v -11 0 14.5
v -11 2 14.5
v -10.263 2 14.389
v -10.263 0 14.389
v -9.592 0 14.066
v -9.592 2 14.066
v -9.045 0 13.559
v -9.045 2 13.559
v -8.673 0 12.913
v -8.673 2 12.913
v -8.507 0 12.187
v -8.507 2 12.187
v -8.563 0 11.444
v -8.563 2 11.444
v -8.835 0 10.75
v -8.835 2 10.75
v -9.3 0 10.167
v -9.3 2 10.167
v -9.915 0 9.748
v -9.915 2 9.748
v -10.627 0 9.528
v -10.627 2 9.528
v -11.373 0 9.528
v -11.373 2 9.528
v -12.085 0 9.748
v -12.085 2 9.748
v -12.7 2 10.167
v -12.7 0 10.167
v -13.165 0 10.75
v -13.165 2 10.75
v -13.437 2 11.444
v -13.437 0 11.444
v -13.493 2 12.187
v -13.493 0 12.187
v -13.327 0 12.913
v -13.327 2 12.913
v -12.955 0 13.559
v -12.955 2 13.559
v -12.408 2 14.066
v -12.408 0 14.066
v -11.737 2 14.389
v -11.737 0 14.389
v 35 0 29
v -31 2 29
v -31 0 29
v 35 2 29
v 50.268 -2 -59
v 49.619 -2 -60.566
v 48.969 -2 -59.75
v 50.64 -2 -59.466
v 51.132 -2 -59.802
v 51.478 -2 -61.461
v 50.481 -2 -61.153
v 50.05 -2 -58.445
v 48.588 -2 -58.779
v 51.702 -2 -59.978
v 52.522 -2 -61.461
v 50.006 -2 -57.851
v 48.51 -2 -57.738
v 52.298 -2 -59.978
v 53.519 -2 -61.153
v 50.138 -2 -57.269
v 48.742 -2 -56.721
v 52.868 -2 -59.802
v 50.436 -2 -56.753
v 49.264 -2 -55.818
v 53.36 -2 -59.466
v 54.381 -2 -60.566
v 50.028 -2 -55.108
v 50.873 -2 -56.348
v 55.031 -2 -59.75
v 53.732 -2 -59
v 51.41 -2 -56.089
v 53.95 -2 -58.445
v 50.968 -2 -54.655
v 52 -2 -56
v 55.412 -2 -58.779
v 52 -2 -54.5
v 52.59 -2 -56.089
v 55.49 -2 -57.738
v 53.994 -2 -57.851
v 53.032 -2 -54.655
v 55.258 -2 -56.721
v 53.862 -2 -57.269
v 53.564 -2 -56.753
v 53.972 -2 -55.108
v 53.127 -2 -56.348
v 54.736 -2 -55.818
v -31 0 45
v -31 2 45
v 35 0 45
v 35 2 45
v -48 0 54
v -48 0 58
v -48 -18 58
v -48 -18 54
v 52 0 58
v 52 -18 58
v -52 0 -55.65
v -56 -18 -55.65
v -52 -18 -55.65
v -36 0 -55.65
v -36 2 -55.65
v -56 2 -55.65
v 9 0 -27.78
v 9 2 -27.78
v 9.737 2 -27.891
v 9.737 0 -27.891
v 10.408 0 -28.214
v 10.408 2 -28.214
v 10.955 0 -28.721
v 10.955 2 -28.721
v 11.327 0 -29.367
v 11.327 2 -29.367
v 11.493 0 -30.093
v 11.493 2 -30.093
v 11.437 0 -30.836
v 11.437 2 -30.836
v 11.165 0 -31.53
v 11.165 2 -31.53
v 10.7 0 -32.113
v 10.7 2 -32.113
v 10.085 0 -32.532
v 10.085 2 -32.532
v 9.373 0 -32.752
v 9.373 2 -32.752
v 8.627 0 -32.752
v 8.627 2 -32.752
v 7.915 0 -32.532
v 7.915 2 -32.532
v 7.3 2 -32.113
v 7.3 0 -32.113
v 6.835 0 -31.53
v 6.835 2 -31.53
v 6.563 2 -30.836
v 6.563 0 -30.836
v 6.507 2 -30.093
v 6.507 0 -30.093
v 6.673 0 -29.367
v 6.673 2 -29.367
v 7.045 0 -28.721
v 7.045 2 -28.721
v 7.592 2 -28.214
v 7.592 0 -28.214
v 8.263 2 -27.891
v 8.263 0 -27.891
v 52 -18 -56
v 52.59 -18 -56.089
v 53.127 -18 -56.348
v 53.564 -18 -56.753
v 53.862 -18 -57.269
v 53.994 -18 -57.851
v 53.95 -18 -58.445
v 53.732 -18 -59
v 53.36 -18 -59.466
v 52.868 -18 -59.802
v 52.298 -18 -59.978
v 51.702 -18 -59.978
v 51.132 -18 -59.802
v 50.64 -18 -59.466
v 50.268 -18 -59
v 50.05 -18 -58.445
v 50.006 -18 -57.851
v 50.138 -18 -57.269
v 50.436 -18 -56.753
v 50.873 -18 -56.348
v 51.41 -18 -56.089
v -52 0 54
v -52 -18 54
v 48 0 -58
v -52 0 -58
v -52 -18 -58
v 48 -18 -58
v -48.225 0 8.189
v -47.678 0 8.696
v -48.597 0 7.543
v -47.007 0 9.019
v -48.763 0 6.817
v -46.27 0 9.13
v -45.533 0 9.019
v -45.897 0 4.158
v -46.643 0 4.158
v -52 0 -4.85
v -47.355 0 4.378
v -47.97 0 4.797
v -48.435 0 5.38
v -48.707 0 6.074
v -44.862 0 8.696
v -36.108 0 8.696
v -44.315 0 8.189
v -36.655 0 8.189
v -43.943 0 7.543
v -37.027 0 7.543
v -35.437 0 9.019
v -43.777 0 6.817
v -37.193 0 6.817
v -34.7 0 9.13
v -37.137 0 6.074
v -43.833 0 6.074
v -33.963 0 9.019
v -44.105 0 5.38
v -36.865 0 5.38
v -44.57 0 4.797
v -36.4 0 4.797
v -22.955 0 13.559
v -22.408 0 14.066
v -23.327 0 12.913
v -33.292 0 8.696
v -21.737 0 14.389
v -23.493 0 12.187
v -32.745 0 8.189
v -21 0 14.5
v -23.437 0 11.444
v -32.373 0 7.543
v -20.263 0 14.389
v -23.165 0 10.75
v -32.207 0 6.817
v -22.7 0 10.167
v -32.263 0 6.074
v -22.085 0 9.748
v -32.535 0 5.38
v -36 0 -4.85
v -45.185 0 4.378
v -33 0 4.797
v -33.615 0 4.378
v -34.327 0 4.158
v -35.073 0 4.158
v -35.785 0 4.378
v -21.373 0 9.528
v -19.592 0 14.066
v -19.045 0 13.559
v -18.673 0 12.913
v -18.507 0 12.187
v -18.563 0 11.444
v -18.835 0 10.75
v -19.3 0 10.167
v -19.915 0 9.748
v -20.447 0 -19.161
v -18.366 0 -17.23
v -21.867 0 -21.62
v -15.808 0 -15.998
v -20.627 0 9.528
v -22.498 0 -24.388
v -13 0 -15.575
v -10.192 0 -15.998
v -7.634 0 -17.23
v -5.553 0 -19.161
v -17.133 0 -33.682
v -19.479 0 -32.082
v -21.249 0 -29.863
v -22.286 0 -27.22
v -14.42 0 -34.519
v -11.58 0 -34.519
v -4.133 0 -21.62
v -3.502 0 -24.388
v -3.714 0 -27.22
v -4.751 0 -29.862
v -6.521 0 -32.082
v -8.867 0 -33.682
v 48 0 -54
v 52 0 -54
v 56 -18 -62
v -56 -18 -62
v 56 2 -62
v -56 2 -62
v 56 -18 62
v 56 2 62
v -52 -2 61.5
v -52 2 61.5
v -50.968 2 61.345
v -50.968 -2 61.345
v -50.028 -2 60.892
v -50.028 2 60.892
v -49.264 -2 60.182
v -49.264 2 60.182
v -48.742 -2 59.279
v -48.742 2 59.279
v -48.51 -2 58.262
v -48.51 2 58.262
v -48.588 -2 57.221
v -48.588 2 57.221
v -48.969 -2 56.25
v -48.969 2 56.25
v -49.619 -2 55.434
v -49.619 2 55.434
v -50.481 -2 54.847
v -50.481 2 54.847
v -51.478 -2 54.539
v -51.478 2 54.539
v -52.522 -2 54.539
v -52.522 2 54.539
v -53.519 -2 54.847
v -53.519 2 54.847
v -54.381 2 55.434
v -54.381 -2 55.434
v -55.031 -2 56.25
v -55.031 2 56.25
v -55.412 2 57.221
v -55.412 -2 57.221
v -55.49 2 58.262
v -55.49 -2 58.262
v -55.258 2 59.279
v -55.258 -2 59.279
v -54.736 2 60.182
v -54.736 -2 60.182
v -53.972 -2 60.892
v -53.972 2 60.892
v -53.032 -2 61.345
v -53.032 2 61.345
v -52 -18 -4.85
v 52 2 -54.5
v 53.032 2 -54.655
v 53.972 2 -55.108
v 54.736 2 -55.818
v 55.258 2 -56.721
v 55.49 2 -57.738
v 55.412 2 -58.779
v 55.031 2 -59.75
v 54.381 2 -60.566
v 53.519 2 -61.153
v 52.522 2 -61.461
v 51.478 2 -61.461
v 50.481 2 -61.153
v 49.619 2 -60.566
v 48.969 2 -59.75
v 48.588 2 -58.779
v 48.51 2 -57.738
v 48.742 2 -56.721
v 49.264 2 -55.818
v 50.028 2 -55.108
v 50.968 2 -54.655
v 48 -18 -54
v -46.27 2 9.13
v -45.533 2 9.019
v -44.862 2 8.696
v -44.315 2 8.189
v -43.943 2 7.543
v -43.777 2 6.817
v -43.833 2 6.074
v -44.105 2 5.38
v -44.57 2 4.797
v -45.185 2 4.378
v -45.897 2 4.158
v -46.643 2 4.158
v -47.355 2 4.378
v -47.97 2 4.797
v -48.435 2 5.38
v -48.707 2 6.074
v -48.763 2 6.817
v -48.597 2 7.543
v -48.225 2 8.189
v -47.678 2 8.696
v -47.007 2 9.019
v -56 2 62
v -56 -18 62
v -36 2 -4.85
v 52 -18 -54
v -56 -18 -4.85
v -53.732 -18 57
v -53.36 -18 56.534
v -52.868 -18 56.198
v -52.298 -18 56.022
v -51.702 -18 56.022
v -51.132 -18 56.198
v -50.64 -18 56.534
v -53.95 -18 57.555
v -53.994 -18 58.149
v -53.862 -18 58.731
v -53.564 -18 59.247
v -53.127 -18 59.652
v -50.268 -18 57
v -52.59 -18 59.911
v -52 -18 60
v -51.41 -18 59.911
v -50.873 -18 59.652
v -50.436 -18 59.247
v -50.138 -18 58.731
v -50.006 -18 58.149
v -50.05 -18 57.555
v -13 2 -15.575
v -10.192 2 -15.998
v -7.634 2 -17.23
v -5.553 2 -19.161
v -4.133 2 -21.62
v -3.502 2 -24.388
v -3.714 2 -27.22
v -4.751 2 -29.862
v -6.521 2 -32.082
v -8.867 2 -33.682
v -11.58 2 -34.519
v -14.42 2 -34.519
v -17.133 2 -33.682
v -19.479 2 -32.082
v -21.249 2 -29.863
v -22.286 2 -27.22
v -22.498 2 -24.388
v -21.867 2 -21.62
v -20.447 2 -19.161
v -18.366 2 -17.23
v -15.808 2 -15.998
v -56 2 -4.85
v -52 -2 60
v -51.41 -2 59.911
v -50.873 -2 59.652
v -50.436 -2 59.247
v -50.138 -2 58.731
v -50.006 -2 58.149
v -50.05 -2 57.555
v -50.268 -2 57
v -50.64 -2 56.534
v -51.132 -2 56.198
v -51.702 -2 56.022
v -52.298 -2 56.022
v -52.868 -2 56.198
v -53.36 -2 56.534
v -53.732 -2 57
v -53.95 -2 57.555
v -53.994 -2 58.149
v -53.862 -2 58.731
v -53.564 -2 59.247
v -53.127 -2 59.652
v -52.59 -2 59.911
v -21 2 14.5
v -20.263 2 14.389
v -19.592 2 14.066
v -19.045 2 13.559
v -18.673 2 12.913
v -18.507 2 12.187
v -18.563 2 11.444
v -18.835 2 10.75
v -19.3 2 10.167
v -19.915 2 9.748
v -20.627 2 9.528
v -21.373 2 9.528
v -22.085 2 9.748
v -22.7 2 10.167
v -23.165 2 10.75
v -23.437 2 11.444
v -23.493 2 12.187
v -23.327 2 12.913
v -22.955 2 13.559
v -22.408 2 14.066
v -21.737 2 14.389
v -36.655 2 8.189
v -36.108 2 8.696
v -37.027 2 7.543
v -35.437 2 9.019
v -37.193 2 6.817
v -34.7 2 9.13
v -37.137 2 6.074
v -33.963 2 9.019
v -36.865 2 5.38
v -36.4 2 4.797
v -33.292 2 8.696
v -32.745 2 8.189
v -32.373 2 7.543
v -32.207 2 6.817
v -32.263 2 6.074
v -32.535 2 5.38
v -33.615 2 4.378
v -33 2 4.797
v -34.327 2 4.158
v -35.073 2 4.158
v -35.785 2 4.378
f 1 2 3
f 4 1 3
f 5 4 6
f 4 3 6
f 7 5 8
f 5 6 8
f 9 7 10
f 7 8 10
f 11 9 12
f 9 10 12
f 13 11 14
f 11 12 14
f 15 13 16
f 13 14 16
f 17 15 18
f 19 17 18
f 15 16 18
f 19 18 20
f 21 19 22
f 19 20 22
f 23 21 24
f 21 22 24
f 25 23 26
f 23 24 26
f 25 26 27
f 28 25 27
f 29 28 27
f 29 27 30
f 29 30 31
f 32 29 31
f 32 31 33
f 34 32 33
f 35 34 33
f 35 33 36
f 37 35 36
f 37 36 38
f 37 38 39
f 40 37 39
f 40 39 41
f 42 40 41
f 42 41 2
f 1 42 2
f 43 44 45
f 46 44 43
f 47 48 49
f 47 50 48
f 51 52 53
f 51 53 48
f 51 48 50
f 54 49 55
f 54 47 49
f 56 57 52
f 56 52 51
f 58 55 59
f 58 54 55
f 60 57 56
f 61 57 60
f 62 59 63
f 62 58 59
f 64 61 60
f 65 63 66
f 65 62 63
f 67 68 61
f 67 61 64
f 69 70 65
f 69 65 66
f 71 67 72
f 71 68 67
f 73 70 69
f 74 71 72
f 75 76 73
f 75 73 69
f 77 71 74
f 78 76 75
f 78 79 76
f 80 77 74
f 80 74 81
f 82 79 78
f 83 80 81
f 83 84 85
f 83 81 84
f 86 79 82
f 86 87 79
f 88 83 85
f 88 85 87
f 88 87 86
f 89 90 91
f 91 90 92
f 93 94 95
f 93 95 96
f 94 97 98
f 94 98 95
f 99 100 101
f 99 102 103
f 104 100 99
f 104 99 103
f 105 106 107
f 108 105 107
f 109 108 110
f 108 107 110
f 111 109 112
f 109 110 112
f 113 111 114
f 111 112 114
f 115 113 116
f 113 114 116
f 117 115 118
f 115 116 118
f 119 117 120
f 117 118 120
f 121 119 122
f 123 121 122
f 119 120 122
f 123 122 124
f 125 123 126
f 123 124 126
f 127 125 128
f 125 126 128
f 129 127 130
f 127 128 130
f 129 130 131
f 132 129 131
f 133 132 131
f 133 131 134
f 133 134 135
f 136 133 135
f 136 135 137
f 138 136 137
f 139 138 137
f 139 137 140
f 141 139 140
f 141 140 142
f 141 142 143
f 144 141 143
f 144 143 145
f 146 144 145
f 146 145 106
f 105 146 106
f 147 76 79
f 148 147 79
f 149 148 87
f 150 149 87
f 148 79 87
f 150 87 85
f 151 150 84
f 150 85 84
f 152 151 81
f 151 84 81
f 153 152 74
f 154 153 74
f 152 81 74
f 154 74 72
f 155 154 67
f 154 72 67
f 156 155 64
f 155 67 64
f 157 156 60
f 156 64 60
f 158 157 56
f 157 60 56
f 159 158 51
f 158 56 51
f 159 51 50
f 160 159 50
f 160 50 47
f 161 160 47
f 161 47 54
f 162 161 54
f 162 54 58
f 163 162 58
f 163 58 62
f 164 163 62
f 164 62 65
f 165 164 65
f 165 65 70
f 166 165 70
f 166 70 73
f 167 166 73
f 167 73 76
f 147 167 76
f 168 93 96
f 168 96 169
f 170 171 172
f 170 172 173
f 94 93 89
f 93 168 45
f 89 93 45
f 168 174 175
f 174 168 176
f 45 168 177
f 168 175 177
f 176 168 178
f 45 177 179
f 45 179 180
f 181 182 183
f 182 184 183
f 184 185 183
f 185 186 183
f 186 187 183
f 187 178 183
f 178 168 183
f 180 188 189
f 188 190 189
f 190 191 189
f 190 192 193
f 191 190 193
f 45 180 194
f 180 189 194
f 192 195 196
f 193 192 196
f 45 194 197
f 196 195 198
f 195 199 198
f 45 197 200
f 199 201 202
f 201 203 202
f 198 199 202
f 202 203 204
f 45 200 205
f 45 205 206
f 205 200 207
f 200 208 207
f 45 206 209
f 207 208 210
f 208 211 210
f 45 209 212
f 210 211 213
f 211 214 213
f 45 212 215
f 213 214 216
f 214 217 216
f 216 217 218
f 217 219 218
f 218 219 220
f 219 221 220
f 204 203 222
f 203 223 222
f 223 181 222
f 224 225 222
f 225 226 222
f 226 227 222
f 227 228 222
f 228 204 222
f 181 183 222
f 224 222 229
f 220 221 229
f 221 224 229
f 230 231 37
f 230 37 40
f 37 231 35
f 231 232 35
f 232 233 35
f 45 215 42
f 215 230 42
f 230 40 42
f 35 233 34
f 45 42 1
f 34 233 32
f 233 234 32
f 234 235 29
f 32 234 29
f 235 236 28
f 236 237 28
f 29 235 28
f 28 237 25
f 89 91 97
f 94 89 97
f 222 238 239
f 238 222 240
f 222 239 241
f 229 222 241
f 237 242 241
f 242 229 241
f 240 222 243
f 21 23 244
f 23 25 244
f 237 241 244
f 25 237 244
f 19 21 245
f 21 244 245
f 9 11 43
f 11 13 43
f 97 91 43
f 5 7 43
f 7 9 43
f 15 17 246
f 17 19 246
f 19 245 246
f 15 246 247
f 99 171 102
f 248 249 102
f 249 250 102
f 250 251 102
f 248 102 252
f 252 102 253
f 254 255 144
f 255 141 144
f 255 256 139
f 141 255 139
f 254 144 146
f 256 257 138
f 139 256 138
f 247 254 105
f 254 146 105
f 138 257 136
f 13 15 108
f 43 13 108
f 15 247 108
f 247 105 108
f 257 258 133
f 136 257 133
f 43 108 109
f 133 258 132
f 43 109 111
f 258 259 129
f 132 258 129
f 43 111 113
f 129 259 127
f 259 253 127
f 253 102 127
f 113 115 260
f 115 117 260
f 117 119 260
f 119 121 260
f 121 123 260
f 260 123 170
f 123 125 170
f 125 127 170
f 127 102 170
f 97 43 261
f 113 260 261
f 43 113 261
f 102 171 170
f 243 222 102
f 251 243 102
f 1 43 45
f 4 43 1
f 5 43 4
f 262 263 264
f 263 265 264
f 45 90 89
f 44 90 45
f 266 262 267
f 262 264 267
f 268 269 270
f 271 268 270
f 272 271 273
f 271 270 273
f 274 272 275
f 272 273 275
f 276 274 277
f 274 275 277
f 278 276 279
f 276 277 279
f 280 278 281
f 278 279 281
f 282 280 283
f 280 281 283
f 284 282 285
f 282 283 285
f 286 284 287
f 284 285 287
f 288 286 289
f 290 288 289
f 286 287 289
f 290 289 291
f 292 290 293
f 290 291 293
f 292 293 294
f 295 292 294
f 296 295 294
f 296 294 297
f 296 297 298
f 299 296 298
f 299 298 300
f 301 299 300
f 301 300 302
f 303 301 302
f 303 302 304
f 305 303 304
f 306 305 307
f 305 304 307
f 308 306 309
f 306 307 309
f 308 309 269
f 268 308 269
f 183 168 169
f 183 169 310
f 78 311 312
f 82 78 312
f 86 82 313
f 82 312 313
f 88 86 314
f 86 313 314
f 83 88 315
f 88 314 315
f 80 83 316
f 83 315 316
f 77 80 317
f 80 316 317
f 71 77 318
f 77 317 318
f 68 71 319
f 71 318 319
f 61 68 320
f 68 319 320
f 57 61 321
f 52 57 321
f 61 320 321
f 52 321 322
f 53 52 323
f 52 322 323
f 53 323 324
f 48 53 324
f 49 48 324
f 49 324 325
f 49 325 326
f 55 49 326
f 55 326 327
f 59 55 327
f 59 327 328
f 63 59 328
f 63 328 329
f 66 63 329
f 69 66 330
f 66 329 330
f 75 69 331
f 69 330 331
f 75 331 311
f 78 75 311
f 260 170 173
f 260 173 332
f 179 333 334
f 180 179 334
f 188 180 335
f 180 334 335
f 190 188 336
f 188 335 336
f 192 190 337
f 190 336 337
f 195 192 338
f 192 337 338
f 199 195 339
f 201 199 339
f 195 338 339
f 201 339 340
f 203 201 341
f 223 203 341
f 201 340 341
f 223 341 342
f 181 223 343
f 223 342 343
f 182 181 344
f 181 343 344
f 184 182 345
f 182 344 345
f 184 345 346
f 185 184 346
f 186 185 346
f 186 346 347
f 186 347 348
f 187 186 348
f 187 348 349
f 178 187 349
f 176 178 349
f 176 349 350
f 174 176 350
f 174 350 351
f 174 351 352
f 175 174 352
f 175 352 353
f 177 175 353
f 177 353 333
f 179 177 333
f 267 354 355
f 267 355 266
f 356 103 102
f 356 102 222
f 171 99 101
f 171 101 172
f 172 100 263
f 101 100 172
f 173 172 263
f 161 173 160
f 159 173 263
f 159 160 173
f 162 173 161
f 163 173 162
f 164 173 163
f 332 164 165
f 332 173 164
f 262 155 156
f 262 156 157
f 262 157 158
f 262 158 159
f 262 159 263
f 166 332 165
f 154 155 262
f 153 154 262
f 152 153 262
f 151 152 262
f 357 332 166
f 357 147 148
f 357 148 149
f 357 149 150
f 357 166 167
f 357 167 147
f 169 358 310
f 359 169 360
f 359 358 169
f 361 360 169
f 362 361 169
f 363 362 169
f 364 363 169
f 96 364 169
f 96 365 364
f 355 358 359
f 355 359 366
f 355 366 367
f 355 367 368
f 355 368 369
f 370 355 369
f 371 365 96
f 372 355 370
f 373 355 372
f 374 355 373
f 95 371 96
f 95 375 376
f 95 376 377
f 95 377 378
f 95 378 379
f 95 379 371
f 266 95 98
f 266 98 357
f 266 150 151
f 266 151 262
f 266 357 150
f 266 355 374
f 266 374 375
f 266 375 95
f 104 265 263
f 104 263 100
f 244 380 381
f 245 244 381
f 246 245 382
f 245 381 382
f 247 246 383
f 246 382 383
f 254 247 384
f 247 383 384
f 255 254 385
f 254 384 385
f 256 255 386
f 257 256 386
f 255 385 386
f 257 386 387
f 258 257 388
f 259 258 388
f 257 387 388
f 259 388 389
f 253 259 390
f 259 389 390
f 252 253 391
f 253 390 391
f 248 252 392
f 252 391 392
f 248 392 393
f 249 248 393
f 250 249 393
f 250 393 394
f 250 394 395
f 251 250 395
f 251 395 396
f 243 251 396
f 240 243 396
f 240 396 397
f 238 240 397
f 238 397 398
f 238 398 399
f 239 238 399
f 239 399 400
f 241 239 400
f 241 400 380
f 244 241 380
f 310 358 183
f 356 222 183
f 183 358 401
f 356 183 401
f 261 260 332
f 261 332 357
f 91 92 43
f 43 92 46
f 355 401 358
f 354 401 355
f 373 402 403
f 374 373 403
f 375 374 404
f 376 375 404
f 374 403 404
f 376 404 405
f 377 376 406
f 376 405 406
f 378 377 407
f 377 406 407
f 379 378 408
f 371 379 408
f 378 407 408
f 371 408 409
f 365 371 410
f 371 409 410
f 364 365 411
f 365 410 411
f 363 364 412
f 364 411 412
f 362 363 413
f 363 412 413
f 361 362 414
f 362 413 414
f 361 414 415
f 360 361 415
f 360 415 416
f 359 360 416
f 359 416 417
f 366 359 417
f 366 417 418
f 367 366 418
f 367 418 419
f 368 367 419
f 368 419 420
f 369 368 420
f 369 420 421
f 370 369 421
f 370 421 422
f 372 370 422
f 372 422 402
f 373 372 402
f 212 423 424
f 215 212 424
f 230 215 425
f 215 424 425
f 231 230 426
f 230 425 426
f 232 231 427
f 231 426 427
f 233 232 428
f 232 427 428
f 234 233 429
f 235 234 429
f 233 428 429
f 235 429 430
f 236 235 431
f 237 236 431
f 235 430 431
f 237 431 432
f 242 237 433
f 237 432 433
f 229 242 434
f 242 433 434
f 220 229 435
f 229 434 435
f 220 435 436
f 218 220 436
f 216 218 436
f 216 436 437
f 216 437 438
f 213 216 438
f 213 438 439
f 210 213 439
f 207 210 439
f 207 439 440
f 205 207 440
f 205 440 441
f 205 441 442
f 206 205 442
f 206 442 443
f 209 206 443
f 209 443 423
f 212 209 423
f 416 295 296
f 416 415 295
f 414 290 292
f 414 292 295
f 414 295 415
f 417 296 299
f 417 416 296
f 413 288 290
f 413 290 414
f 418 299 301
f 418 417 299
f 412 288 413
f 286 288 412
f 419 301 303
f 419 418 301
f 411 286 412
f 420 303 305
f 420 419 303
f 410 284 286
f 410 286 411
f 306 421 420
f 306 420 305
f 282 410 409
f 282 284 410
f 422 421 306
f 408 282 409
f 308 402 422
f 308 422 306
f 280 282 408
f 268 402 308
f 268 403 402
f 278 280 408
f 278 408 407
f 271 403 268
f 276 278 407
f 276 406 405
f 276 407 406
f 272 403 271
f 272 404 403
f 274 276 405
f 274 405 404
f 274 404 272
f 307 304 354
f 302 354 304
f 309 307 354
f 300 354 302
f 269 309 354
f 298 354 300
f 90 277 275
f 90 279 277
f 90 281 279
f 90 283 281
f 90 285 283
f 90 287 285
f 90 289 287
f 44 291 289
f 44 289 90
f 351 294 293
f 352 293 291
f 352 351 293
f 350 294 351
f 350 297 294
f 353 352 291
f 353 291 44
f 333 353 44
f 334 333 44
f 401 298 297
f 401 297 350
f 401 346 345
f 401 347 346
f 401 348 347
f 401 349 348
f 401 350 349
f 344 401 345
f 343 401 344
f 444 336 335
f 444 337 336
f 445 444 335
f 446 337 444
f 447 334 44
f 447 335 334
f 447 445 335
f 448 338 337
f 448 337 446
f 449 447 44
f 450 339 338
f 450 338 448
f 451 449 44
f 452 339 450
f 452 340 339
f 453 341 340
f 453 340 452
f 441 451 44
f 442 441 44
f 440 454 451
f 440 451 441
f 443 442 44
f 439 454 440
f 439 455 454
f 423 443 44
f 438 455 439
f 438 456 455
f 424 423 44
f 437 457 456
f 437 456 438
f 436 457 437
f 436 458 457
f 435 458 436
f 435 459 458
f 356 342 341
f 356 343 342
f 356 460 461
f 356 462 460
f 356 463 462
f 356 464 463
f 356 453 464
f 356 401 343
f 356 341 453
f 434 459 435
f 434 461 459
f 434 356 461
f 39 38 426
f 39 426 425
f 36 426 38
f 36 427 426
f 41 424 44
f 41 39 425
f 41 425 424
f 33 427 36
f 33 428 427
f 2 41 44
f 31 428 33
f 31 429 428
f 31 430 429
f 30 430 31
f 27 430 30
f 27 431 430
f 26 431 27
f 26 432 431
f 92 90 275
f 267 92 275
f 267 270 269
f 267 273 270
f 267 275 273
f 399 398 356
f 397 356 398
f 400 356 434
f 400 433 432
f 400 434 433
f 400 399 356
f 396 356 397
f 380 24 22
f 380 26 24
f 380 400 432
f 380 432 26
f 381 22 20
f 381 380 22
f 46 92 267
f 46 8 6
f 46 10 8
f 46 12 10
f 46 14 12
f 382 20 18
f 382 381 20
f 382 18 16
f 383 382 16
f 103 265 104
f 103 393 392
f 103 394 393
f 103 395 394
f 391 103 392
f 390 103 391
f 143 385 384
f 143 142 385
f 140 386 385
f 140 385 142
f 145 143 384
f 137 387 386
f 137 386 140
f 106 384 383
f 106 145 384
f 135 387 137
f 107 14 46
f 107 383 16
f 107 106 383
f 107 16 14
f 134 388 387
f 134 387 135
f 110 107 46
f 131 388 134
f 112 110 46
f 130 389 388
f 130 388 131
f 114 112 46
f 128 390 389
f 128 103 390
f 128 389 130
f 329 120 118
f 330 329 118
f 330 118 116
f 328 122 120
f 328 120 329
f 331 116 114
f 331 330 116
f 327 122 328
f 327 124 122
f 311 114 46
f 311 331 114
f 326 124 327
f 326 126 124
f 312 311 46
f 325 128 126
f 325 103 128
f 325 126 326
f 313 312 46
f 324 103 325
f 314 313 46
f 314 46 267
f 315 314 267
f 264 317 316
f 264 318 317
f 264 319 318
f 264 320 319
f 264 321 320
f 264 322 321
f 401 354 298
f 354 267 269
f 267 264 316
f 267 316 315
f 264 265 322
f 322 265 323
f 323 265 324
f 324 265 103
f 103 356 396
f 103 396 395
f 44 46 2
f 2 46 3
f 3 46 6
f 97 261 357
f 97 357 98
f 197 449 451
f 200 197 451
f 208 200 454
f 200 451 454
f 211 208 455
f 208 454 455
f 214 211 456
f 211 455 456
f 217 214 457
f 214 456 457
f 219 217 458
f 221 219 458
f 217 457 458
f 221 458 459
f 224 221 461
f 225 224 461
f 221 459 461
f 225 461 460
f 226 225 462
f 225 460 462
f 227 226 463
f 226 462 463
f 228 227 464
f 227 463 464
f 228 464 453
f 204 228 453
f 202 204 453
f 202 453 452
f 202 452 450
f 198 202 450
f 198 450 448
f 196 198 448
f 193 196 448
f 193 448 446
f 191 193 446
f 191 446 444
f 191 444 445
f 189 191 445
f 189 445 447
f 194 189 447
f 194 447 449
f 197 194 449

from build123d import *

# Parameters (mm, degrees)
SKETCH1_W           = 112
SKETCH1_H           = 124
BOSS_EXTRUDE1_DEPTH = 2
SKETCH4_W           = 112
SKETCH4_H           = 124
BOSS_EXTRUDE2_DEPTH = 18
CUT_EXTRUDE1_REACH  = 87.907
SKETCH5_R           = 9.525
SKETCH5_R_2         = 2.5
SKETCH5_W           = 66
SKETCH5_H           = 16
SKETCH6_R           = 2
CUT_EXTRUDE2_DEPTH  = 86.90692638
SKETCH7_R           = 3.5
CUT_EXTRUDE3_DEPTH  = 4
SKETCH8_W           = 50.8
SKETCH8_H           = 20
CUT_EXTRUDE4_DEPTH  = 20


with BuildPart() as part:
    # Sketch1 → Boss-Extrude1 (new body)
    with BuildSketch(Plane(origin=(0, 0, 0), x_dir=(1, 0, 0), z_dir=(0, 1, 0))):
        Rectangle(SKETCH1_W, SKETCH1_H)
    extrude(amount=BOSS_EXTRUDE1_DEPTH)

    # Sketch4 → Boss-Extrude2 (add)
    with BuildSketch(Plane.XZ):
        Rectangle(SKETCH4_W, SKETCH4_H)
        Polygon((-48, 58), (-48, 54), (-52, 54), (-52, -58), (48, -58), (48, -54), (52, -54), (52, 58), align=None, mode=Mode.SUBTRACT)
    extrude(amount=BOSS_EXTRUDE2_DEPTH)

    # Sketch5 → Cut-Extrude1 (cut, up to next)
    with BuildSketch(Plane(origin=(0, 2, 0), x_dir=(1, 0, 0), z_dir=(0, 1, 0)), mode=Mode.PRIVATE) as cut_extrude1_sk1:
        with Locations(Location((-13, 25.1, 0), (0, 0, 270))):
            Circle(SKETCH5_R)
    cut_extrude1_tool1 = extrude(cut_extrude1_sk1.sketch, amount=-CUT_EXTRUDE1_REACH, mode=Mode.PRIVATE) & part.part
    # Sketch5 → Cut-Extrude1 (cut, up to next)
    with BuildSketch(Plane(origin=(0, 2, 0), x_dir=(1, 0, 0), z_dir=(0, 1, 0)), mode=Mode.PRIVATE) as cut_extrude1_sk2:
        with Locations(Location((-46.27, -6.63, 0), (0, 0, 270))):
            Circle(SKETCH5_R_2)
    cut_extrude1_tool2 = extrude(cut_extrude1_sk2.sketch, amount=-CUT_EXTRUDE1_REACH, mode=Mode.PRIVATE) & part.part
    # Sketch5 → Cut-Extrude1 (cut, up to next)
    with BuildSketch(Plane(origin=(0, 2, 0), x_dir=(1, 0, 0), z_dir=(0, 1, 0)), mode=Mode.PRIVATE) as cut_extrude1_sk3:
        with Locations(Location((-34.7, -6.63, 0), (0, 0, 270))):
            Circle(SKETCH5_R_2)
    cut_extrude1_tool3 = extrude(cut_extrude1_sk3.sketch, amount=-CUT_EXTRUDE1_REACH, mode=Mode.PRIVATE) & part.part
    # Sketch5 → Cut-Extrude1 (cut, up to next)
    with BuildSketch(Plane(origin=(0, 2, 0), x_dir=(1, 0, 0), z_dir=(0, 1, 0)), mode=Mode.PRIVATE) as cut_extrude1_sk4:
        with Locations(Location((-21, -12, 0), (0, 0, 270))):
            Circle(SKETCH5_R_2)
    cut_extrude1_tool4 = extrude(cut_extrude1_sk4.sketch, amount=-CUT_EXTRUDE1_REACH, mode=Mode.PRIVATE) & part.part
    # Sketch5 → Cut-Extrude1 (cut, up to next)
    with BuildSketch(Plane(origin=(0, 2, 0), x_dir=(1, 0, 0), z_dir=(0, 1, 0)), mode=Mode.PRIVATE) as cut_extrude1_sk5:
        with Locations(Location((-11, -12, 0), (0, 0, 270))):
            Circle(SKETCH5_R_2)
    cut_extrude1_tool5 = extrude(cut_extrude1_sk5.sketch, amount=-CUT_EXTRUDE1_REACH, mode=Mode.PRIVATE) & part.part
    # Sketch5 → Cut-Extrude1 (cut, up to next)
    with BuildSketch(Plane(origin=(0, 2, 0), x_dir=(1, 0, 0), z_dir=(0, 1, 0)), mode=Mode.PRIVATE) as cut_extrude1_sk6:
        with Locations(Location((9, 30.28, 0), (0, 0, 270))):
            Circle(SKETCH5_R_2)
    cut_extrude1_tool6 = extrude(cut_extrude1_sk6.sketch, amount=-CUT_EXTRUDE1_REACH, mode=Mode.PRIVATE) & part.part
    # Sketch5 → Cut-Extrude1 (cut, up to next)
    with BuildSketch(Plane(origin=(0, 2, 0), x_dir=(1, 0, 0), z_dir=(0, 1, 0)), mode=Mode.PRIVATE) as cut_extrude1_sk7:
        with Locations((2, -37)):
            Rectangle(SKETCH5_W, SKETCH5_H)
    cut_extrude1_tool7 = extrude(cut_extrude1_sk7.sketch, amount=-CUT_EXTRUDE1_REACH, mode=Mode.PRIVATE) & part.part
    add(cut_extrude1_tool1.solids().sort_by_distance((-13, 2, -25.1))[0], mode=Mode.SUBTRACT)
    add(cut_extrude1_tool2.solids().sort_by_distance((-46.27, 2, 6.63))[0], mode=Mode.SUBTRACT)
    add(cut_extrude1_tool3.solids().sort_by_distance((-34.7, 2, 6.63))[0], mode=Mode.SUBTRACT)
    add(cut_extrude1_tool4.solids().sort_by_distance((-21, 2, 12))[0], mode=Mode.SUBTRACT)
    add(cut_extrude1_tool5.solids().sort_by_distance((-11, 2, 12))[0], mode=Mode.SUBTRACT)
    add(cut_extrude1_tool6.solids().sort_by_distance((9, 2, -30.28))[0], mode=Mode.SUBTRACT)
    add(cut_extrude1_tool7.solids().sort_by_distance((2, 2, 37))[0], mode=Mode.SUBTRACT)

    # Sketch6 → Cut-Extrude2 (cut, through all)
    with BuildSketch(Plane(origin=(0, 2, 0), x_dir=(1, 0, 0), z_dir=(0, 1, 0))):
        with Locations(Location((52, 58, 0), (0, 0, 270))):
            Circle(SKETCH6_R)
        with Locations(Location((-52, -58, 0), (0, 0, 270))):
            Circle(SKETCH6_R)
    extrude(amount=-CUT_EXTRUDE2_DEPTH, mode=Mode.SUBTRACT)

    # Sketch7 → Cut-Extrude3 (cut)
    with BuildSketch(Plane(origin=(0, 2, 0), x_dir=(1, 0, 0), z_dir=(0, 1, 0))):
        with Locations(Location((-52, -58, 0), (0, 0, 270))):
            Circle(SKETCH7_R)
        with Locations(Location((52, 58, 0), (0, 0, 270))):
            Circle(SKETCH7_R)
    extrude(amount=-CUT_EXTRUDE3_DEPTH, mode=Mode.SUBTRACT)

    # Sketch8 → Cut-Extrude4 (cut)
    with BuildSketch(Plane.ZY.offset(56)):
        with Locations((-30.25, -8)):
            Rectangle(SKETCH8_W, SKETCH8_H)
    extrude(amount=-CUT_EXTRUDE4_DEPTH, mode=Mode.SUBTRACT)


solid = part.part
